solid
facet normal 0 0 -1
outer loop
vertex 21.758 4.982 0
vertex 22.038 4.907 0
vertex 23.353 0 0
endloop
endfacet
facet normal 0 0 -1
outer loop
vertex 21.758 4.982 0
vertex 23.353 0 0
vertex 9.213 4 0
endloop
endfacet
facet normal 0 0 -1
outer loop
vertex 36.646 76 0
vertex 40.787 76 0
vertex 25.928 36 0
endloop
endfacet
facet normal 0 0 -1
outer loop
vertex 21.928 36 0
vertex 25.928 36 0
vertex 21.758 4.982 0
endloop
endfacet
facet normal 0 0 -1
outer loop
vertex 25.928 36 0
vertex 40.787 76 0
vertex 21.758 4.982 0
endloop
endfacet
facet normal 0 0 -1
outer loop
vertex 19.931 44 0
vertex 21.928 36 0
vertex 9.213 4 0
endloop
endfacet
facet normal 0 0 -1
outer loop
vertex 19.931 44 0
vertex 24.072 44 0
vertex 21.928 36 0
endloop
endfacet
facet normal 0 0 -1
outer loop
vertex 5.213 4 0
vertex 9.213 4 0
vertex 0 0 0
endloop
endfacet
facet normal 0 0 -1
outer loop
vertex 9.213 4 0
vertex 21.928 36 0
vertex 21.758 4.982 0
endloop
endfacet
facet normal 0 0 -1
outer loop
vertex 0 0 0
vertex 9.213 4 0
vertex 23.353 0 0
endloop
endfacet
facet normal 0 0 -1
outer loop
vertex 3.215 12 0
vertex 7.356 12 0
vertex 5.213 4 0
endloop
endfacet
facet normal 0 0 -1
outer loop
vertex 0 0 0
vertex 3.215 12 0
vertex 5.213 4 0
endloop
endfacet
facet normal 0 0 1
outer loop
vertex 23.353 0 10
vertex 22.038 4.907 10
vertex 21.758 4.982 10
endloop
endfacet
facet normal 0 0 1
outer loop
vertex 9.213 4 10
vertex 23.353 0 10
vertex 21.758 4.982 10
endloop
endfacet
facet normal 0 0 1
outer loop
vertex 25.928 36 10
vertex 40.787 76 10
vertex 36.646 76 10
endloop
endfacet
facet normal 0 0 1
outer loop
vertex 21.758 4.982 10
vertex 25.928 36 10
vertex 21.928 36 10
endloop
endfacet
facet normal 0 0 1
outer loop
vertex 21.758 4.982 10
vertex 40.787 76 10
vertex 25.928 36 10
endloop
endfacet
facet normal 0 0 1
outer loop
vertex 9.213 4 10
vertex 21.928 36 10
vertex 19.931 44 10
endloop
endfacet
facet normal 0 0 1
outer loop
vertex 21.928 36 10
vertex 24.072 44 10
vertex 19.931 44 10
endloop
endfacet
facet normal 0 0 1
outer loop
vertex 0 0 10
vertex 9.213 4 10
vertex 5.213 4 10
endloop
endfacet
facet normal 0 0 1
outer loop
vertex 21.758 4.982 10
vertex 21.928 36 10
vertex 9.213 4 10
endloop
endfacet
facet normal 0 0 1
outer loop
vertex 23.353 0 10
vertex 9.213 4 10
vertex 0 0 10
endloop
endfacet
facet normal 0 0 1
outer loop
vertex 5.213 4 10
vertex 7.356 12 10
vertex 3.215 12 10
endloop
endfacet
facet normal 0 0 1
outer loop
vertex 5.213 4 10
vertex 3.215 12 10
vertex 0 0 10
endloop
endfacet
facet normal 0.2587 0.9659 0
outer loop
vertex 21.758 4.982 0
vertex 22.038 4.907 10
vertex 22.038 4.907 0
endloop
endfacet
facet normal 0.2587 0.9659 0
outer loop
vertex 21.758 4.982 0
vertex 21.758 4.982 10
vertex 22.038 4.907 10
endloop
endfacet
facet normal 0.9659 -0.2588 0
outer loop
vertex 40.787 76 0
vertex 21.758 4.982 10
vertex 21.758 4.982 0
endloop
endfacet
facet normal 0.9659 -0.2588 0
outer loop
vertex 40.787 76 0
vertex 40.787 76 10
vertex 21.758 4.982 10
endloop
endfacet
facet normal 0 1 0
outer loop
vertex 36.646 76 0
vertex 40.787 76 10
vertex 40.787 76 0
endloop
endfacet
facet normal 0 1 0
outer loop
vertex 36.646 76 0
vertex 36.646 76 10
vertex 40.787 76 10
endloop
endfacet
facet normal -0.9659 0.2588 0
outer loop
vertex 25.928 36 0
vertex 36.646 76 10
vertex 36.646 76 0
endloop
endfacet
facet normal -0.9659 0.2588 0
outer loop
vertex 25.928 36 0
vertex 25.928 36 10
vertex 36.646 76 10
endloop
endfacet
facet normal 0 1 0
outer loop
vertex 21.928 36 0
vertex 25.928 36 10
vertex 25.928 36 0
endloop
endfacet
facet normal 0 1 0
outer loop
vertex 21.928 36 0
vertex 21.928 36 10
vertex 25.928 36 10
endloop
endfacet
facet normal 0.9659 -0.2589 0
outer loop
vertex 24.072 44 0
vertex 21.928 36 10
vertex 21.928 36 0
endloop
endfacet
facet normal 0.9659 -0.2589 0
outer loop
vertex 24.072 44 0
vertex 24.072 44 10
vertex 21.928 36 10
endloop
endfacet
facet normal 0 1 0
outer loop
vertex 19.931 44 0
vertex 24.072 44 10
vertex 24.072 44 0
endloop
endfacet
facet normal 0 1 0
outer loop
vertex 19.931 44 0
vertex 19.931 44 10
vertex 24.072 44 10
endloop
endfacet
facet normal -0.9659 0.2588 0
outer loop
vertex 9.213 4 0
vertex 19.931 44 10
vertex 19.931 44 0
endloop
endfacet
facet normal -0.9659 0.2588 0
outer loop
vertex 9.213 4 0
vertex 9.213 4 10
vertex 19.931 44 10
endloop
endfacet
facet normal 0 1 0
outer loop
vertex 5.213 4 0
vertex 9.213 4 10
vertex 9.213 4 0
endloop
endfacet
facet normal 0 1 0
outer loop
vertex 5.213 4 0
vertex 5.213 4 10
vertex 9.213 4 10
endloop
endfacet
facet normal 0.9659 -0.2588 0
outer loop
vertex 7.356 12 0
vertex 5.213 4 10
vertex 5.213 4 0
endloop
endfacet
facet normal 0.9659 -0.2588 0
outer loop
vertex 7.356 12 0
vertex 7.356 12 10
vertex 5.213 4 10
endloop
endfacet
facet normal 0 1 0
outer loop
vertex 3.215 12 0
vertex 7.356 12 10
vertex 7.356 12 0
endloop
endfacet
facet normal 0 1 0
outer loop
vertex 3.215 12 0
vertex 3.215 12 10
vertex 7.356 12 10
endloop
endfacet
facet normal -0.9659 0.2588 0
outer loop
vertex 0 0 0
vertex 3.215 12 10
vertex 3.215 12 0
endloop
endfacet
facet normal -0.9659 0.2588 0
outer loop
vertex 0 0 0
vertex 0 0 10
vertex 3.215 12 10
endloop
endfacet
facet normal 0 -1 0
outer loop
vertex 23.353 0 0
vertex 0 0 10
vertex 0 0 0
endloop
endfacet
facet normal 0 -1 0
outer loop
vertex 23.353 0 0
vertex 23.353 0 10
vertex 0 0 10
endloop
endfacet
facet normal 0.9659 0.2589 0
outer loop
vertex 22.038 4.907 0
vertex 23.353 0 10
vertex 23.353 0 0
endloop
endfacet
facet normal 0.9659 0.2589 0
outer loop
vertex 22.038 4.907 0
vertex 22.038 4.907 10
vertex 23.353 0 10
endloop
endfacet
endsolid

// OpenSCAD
$fn = 60;

angle = 15; // [ 0 : 45 ]

wall_grip = 8; // [ 1 : .01 : 16 ]

wall_thick = 4; // [ 1 : .01 : 10 ]
gap_thick = 4; //  [ 1 : .01 : 10 ]
card_support = 40; // [ 1 : .01 : 100 ]
$champstfer = 0 ; // [0 : .01 : 8]

base = wall_thick / cos(angle);
layer_altitude_offset = card_support - wall_grip; 

back_altitude = layer_altitude_offset + card_support + wall_thick; 
backfoot = 5; // [ 0 : 0.01 : 50 ]
backfoot_altitude = 32; // [1 : 0.01 : 64]

z_beam = false;

offset_x = 0.01; // [ 0 : 0.01 : 120 ]
offset_y = 0.01; // [ 0 : 0.01 : 120 ]

offset = [offset_x, offset_y ,0.01 ];

length = 10; // [ 10 : 210 ] 

color("lime")
linear_extrude(length)
holder();


if (z_beam){
color("hotpink")
translate(offset)
linear_extrude(.5)
rotate(180)
holder();
}

module holder(){
//base
skewre( 3 * base + 2 * gap_thick, wall_thick , angle );

// first wall
skewre( base, wall_grip + wall_thick, angle );

// second wall
translate([ base + gap_thick ,0 ])
skewre( base, card_support + wall_thick, angle );

// raised floor
translate([1.5 * base + gap_thick ,0 ])
skewre( base + gap_thick, layer_altitude_offset + wall_thick , angle );

// // back wall
translate([ 2 * base + 2 * gap_thick ,0,0])
skewre( base, back_altitude, angle );

back_x = 2.5 * base + 2 * gap_thick;

ep_bf = backfoot + 0.5 * base;

// support back foot
translate( [  back_x , 0 ] )
intersection() {
    
        skewre( ep_bf, backfoot_altitude , angle );
        translate([-base/2,0,0])
        skewre( ep_bf, backfoot_altitude , -angle );
        
        translate([ep_bf, wall_thick])
        rotate(180 - angle)
        square(max(backfoot * base, backfoot_altitude));
}

// debug_sphere([ep_bf, wall_thick] + [  back_x , 0 ]);

module skewre( base, altitude, angle, $champstfer = $champstfer ){
    // A "square" skewed along it's base
    hypot = altitude / cos(angle);
    reach = hypot * sin(angle);
    
    c1 = $champstfer * sin(angle);
    c2 = $champstfer * cos(angle);
    
    polygon([
        [ c1, c2 ],
        // [ reach , altitude],
        [ reach - c1, altitude - c2],
        [ reach + $champstfer, altitude],
        
        // [ reach + base, altitude ],
        [ reach + base - $champstfer, altitude ],
        [ reach + base - c1 , altitude - c2],
        
        // [ base, 0 ],
        [ base + c1,  c2],
        [ base - $champstfer , 0 ],
        
        [ $champstfer, 0 ],
    ]);
}
}

module debug_sphere(location, size = 0.25, sp_color = "red"){
    color(sp_color)
    translate(location)
    sphere(size);
}
